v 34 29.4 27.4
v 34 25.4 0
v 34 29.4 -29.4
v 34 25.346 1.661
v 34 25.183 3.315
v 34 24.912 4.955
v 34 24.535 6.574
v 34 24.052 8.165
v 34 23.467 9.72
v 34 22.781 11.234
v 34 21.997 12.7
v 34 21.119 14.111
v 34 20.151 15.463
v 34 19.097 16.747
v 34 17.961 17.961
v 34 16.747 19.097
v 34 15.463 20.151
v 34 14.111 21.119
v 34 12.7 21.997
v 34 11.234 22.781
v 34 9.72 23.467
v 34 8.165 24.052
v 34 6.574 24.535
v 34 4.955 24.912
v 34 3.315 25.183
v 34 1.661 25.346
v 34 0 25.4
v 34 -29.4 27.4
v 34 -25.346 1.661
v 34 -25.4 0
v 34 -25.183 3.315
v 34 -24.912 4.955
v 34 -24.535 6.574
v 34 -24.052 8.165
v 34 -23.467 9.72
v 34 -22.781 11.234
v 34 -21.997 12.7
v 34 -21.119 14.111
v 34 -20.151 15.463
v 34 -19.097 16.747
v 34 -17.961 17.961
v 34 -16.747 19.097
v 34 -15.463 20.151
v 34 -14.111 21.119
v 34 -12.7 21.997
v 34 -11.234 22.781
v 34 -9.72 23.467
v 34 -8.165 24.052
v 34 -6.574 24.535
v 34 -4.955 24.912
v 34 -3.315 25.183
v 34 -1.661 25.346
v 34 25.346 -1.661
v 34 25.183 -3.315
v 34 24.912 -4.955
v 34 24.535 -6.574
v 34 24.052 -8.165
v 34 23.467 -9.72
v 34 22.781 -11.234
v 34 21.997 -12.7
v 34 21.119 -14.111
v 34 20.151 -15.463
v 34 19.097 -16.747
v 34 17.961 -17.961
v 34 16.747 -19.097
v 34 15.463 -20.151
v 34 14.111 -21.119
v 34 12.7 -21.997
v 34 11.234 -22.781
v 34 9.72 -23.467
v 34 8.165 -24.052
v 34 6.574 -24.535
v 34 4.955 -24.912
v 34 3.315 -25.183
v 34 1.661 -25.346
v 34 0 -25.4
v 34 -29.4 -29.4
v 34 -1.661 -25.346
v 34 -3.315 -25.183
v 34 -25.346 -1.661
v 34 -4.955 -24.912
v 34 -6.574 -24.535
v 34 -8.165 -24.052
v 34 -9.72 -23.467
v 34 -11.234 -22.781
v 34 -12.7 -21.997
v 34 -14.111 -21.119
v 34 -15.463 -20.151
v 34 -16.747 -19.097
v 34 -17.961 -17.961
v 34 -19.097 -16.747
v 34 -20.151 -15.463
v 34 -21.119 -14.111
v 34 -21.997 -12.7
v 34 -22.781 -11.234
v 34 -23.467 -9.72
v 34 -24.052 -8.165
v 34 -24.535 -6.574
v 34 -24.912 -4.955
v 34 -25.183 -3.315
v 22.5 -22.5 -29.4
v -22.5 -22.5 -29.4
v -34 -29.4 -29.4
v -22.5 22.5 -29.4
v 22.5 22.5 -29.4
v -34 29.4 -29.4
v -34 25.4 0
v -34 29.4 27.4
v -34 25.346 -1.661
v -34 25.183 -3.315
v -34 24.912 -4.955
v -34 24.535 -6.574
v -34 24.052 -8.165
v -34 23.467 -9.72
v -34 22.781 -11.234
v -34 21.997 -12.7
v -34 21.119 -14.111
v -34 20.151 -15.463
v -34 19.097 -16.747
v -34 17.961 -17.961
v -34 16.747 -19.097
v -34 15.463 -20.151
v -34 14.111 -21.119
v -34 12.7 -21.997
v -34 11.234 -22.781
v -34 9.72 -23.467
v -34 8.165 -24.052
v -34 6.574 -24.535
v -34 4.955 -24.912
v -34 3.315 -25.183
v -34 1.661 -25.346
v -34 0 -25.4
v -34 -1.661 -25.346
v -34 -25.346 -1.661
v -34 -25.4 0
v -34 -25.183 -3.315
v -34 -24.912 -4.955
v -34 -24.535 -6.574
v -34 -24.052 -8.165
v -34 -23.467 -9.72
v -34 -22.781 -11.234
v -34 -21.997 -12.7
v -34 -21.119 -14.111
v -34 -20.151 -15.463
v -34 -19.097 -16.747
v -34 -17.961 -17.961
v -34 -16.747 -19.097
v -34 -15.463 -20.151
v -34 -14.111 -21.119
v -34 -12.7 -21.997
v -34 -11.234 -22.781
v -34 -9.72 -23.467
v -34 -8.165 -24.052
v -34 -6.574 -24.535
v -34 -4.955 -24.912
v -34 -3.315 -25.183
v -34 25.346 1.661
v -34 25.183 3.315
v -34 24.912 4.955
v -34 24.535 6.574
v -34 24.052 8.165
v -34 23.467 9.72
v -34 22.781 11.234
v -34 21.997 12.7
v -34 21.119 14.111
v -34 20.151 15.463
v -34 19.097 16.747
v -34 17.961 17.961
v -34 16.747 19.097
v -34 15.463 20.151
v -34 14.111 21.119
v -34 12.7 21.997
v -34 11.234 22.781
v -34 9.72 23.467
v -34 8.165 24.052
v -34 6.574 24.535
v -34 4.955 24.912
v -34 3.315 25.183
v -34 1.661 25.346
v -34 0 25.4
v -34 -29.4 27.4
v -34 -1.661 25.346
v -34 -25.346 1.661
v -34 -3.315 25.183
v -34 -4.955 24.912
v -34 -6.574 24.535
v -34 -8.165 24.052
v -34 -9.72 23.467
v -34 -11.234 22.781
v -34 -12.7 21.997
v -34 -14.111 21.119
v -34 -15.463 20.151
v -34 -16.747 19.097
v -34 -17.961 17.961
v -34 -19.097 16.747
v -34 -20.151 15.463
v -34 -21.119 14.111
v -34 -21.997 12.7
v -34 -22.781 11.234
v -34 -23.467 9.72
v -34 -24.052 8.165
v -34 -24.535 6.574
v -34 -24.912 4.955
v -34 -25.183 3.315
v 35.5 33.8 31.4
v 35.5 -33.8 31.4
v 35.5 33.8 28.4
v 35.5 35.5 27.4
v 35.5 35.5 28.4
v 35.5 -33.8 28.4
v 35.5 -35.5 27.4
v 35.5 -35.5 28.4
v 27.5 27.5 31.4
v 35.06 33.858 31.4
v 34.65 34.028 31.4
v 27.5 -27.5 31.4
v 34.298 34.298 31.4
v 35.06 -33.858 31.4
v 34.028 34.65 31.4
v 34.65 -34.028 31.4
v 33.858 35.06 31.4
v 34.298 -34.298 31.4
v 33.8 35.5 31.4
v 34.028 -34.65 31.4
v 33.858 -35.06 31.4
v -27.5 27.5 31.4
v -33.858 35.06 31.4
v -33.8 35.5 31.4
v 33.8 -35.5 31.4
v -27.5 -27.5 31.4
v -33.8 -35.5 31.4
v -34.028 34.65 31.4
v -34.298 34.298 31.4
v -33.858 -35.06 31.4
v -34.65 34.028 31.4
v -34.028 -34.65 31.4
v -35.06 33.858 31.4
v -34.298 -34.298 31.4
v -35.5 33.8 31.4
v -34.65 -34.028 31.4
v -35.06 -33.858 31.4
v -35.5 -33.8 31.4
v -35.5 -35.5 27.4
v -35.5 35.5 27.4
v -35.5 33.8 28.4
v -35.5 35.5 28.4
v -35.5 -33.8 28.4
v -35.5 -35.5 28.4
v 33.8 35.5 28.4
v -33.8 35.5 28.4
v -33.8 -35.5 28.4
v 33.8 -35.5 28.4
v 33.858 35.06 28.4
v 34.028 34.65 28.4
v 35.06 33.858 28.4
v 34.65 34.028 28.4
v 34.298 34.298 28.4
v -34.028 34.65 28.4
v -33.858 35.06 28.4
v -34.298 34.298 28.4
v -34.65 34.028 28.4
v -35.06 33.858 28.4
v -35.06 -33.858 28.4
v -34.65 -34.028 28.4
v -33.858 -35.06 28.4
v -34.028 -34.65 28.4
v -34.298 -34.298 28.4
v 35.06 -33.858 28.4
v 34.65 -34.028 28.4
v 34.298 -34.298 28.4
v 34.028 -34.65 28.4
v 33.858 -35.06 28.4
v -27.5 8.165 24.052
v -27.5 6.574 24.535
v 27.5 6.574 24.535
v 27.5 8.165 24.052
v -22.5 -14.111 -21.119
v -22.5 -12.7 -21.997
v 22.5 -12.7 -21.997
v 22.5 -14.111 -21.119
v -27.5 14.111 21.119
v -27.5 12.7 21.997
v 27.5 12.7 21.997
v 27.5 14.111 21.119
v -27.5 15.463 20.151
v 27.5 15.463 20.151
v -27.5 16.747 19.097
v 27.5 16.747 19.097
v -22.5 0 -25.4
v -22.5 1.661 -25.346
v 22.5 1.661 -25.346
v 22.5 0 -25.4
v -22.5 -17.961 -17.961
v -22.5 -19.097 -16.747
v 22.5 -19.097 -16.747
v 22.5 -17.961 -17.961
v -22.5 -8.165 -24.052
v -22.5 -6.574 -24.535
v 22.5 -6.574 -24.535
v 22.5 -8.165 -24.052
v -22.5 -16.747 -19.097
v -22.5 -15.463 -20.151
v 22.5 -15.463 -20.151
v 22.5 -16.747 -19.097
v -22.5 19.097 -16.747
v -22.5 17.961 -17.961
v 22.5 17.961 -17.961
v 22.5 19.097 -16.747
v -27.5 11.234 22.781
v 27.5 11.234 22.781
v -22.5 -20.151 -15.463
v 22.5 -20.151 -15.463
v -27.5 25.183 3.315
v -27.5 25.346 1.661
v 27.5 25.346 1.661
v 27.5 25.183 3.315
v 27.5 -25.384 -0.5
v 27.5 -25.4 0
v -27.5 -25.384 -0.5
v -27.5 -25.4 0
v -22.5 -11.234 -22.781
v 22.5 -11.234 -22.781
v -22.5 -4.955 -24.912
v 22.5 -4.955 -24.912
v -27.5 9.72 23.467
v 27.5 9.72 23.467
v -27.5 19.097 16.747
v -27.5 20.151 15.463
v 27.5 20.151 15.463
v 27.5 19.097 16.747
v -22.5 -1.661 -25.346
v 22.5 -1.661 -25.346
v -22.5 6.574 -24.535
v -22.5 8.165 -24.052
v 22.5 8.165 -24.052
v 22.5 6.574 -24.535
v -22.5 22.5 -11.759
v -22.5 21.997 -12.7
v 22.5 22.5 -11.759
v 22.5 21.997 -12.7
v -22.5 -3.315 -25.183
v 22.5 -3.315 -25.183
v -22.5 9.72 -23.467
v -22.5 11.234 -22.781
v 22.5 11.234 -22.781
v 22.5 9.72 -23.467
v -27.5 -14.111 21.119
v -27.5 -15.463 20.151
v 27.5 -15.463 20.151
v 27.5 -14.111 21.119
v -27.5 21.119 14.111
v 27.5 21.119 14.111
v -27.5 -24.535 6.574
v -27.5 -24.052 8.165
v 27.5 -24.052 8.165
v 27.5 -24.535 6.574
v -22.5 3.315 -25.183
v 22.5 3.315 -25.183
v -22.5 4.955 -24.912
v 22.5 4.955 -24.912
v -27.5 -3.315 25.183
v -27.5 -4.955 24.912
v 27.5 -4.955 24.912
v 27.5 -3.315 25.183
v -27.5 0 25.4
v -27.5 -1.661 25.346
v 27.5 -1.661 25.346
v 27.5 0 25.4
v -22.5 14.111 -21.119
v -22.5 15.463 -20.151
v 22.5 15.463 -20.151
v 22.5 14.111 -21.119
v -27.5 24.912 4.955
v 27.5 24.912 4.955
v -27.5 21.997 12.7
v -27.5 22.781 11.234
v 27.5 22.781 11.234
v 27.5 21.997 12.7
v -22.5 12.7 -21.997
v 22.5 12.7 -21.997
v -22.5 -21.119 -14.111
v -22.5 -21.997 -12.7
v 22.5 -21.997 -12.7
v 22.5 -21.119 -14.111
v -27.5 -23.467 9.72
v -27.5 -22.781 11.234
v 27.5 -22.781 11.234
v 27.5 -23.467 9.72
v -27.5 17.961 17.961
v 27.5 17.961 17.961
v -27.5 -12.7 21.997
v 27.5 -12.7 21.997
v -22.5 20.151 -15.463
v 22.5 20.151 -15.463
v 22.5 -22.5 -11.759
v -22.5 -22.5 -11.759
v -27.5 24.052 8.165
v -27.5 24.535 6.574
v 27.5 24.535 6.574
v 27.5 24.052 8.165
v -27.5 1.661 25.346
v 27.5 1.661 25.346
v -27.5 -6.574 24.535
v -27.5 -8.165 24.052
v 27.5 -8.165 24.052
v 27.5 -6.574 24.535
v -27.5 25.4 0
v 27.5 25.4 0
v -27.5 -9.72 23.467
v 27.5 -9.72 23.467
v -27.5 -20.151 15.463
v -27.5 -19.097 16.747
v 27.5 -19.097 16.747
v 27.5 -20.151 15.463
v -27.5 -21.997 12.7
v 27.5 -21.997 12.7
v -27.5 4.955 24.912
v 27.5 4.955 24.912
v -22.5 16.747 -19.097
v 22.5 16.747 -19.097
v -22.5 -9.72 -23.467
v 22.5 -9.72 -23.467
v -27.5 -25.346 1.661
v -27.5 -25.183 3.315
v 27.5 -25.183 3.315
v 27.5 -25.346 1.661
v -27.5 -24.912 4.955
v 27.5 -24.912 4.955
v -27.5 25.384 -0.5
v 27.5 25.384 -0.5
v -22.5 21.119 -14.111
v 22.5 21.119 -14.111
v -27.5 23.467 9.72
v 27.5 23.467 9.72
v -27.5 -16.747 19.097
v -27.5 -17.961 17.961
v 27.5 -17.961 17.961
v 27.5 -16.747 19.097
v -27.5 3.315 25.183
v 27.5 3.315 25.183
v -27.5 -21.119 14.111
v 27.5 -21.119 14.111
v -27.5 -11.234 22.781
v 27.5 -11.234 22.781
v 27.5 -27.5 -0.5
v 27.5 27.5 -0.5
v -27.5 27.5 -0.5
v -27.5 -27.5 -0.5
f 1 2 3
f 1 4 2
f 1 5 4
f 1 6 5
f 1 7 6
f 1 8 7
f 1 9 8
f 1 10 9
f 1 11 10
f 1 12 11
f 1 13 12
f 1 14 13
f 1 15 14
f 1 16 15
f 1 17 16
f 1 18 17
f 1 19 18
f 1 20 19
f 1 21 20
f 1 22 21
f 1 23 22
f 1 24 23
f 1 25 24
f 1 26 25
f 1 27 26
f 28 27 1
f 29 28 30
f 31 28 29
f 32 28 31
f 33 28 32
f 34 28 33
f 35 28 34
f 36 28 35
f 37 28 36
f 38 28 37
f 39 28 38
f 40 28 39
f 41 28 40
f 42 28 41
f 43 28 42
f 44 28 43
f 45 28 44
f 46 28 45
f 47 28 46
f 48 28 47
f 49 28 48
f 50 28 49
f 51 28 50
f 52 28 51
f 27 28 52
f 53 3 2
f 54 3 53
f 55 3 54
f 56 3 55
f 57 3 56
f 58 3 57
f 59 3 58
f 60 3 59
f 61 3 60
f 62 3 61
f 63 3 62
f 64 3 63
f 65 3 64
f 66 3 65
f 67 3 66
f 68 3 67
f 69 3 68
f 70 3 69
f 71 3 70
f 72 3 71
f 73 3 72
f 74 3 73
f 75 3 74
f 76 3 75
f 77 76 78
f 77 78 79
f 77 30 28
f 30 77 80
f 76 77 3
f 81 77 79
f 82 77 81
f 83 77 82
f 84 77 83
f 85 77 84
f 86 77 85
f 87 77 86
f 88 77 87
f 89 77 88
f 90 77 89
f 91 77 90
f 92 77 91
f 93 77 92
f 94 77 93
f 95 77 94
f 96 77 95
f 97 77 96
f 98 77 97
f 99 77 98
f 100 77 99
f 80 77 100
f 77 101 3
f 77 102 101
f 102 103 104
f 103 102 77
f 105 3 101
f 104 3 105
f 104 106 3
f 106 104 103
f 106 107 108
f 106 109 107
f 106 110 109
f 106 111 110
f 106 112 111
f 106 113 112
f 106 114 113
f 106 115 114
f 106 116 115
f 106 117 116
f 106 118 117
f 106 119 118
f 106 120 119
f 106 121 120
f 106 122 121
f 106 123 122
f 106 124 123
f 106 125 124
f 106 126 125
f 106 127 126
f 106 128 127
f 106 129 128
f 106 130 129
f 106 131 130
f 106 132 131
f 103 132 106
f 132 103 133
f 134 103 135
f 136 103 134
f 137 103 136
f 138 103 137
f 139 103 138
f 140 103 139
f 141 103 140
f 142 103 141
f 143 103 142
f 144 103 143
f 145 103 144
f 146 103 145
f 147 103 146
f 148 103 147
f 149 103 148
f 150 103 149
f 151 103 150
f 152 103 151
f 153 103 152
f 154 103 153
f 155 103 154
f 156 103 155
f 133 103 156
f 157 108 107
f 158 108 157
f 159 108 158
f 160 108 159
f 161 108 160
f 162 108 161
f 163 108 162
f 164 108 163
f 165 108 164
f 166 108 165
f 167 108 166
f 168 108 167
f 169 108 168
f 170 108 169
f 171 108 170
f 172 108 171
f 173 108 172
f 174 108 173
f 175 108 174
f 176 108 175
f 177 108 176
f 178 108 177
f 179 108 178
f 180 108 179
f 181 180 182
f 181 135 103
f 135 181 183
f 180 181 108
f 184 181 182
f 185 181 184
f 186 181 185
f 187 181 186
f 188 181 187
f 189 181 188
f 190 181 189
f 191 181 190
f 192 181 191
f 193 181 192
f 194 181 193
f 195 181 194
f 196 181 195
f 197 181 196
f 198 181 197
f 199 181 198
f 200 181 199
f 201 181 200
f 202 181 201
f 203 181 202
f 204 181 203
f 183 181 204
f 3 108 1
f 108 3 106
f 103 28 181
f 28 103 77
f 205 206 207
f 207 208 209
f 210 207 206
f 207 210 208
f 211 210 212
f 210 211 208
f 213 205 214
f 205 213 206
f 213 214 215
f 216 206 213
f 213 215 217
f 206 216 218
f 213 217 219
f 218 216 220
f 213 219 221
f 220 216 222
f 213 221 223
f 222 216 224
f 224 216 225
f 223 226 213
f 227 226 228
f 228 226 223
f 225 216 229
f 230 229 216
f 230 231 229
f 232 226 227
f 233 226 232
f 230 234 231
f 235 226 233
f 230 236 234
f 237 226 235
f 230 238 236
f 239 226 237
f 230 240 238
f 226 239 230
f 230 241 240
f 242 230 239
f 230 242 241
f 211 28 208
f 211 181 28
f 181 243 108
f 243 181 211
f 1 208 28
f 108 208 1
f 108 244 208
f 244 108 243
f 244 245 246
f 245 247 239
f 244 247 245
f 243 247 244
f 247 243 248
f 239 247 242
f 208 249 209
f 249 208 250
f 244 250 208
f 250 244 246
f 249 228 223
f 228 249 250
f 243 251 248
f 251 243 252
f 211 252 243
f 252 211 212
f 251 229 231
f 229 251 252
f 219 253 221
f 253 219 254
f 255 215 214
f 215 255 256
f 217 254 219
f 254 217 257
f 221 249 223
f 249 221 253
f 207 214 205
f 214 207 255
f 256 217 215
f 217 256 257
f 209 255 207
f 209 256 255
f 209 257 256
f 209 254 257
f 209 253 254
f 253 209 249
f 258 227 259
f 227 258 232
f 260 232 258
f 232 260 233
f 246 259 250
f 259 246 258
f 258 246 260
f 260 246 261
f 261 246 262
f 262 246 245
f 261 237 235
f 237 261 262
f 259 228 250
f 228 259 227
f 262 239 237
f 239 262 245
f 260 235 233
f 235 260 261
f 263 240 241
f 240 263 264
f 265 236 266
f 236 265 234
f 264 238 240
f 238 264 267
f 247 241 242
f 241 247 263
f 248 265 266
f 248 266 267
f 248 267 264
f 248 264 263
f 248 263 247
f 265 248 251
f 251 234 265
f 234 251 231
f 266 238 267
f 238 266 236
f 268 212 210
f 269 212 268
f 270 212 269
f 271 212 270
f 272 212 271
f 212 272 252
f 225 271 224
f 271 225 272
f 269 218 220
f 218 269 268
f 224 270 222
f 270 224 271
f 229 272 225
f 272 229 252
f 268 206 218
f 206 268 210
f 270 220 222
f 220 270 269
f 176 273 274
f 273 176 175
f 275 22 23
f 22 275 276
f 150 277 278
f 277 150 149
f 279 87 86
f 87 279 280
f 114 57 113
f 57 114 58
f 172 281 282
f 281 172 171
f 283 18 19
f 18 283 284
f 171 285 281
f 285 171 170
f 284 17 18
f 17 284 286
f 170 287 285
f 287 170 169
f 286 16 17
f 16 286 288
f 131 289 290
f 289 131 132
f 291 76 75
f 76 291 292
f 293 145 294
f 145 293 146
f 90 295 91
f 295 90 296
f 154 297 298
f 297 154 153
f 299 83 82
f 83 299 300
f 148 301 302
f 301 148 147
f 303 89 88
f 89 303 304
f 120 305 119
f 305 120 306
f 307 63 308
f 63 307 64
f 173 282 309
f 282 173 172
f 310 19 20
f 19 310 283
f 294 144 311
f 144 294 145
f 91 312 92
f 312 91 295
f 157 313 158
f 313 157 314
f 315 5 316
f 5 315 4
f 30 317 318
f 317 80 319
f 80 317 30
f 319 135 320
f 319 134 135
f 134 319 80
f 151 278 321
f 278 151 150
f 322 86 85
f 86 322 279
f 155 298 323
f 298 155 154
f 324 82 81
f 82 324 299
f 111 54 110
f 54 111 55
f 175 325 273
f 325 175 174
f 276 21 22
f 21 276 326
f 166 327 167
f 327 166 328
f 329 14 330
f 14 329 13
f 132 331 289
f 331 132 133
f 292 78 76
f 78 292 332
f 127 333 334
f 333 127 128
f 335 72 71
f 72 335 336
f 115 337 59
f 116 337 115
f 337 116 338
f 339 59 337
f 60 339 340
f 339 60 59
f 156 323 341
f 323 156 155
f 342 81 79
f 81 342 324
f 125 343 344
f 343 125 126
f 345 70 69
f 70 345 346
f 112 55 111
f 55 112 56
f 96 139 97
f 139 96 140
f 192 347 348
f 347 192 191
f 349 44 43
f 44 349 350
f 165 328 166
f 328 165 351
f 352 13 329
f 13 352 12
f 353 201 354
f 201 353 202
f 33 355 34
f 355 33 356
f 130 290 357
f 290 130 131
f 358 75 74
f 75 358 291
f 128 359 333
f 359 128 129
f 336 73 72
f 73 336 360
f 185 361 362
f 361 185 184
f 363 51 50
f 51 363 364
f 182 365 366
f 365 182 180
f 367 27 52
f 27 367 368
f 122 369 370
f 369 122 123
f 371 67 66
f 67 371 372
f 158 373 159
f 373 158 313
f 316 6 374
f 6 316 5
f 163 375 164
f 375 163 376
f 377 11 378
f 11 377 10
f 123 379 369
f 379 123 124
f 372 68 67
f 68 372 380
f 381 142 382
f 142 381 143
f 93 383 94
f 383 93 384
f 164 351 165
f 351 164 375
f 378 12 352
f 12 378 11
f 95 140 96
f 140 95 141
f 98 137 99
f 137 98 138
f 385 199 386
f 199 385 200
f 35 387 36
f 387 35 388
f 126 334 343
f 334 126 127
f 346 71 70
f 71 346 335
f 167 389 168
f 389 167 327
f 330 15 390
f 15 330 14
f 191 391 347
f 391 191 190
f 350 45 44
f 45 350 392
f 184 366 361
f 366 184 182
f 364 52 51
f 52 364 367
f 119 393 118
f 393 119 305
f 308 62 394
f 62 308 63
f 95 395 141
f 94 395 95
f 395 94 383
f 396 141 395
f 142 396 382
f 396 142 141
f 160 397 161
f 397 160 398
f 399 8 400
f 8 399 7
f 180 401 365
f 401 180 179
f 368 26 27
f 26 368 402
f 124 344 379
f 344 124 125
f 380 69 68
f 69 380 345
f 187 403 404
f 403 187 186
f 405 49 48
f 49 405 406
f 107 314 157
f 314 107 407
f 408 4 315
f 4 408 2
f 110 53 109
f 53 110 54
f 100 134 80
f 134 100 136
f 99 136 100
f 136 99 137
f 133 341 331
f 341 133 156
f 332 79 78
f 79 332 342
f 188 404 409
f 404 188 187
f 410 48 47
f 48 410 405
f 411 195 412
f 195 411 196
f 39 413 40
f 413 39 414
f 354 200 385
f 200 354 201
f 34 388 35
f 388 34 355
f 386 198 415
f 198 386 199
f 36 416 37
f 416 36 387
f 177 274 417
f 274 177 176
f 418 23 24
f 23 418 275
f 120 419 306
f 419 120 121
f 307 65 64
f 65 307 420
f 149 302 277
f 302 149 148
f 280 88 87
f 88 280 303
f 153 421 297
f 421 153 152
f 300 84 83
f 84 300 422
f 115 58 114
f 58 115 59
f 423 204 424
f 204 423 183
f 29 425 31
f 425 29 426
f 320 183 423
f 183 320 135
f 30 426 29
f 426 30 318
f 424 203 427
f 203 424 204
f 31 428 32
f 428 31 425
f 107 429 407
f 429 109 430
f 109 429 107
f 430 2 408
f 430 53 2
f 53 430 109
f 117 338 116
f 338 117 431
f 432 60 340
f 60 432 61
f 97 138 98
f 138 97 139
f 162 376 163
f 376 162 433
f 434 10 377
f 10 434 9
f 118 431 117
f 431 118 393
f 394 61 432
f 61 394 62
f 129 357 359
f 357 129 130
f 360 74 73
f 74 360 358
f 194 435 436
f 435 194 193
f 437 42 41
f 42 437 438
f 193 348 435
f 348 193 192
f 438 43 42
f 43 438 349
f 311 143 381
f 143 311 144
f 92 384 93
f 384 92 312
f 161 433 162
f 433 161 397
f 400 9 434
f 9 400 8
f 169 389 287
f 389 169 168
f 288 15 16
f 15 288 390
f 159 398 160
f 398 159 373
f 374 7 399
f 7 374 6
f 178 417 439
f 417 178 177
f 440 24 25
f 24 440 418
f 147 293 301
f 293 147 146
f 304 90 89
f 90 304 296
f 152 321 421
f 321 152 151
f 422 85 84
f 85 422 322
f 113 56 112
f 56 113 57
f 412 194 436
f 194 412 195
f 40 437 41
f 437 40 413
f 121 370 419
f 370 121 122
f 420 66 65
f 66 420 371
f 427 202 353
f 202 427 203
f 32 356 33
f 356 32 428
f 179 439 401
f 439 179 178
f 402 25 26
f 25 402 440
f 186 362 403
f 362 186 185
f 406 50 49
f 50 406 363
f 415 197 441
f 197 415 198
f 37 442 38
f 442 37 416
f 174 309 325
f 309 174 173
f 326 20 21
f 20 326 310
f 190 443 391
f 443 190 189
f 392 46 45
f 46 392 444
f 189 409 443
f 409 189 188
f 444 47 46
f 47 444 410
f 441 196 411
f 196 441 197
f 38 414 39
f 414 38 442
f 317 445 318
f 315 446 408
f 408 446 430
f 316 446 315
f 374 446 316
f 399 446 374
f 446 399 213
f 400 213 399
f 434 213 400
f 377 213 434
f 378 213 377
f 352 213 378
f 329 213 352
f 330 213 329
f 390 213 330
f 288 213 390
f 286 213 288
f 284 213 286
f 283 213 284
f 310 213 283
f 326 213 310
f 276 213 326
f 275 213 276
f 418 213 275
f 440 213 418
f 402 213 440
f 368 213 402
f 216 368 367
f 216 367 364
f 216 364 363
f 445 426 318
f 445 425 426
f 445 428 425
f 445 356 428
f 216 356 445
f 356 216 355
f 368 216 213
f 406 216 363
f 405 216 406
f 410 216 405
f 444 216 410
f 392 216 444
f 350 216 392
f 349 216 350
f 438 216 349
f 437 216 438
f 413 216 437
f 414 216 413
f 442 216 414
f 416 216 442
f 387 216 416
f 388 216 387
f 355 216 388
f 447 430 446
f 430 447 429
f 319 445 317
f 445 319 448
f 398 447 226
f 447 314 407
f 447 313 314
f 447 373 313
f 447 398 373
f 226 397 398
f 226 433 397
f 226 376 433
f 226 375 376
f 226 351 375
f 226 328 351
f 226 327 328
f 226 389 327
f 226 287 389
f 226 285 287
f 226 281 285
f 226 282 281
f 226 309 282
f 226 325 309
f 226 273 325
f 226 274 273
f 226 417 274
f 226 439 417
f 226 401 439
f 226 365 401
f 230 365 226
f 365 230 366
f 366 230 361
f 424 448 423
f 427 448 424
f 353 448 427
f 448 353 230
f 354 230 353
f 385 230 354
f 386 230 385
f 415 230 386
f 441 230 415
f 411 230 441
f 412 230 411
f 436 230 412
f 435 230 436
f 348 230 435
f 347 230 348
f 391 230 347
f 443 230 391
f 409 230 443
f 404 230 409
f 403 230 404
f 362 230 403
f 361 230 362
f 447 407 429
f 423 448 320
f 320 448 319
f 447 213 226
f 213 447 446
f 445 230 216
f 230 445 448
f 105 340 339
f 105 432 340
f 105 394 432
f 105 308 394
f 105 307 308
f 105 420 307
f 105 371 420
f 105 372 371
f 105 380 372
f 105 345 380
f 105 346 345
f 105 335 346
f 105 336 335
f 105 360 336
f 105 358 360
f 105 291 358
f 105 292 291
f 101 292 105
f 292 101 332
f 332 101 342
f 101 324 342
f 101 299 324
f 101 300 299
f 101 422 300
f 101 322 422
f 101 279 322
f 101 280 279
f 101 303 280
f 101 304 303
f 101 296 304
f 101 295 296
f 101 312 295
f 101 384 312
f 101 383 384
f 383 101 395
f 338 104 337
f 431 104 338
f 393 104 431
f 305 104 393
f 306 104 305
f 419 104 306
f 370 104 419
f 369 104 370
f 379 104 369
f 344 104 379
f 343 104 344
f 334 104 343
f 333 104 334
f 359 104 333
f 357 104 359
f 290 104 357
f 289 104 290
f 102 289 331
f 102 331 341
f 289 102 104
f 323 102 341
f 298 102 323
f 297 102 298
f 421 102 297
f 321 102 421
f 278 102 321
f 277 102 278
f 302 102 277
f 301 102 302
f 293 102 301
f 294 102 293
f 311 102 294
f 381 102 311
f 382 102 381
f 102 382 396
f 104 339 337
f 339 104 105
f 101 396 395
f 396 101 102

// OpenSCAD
// file: common.scad
// common.scad — every dimension in the feeder lives here.
// Change a value, re-run ../check.sh, and every part regrows together.

/* ---------- Printer envelope ---------- */
bed_x = 220;
bed_y = 220;
bed_z = 250;

/* ---------- Material and process ---------- */
wall      = 2.0;    // nominal wall thickness (5 perimeters at 0.4 nozzle)
fit_slide = 0.30;   // clearance for parts that must move against each other
fit_press = 0.15;   // clearance for parts pressed together
$fn       = 96;

/* ---------- Fasteners ---------- */
m3_free = 3.4;      // M3 clearance hole
m3_tap  = 2.8;      // M3 self-tapping into plastic
m4_free = 4.5;

/* ---------- Load cells (VERIFY against the cells you actually buy) ----------
   Figures below are for the common YZC-133 straight bar. Bolt spacing varies
   between suppliers; measure yours before printing the base or the platform. */
cell_l            = 80;
cell_w            = 12.7;
cell_h            = 12.7;
cell_bolt_spacing = 15;   // centre-to-centre, at each end
cell_gap          = 3;    // spacer thickness — the beam MUST be free to flex

/* ---------- Food model ---------- */
kibble_density = 0.40;   // g/cm^3, dry kibble bulk density

/* ---------- Hopper ---------- */
hopper_volume_l = 2.0;
hopper_mouth    = 140;   // inner, square, at the top
hopper_throat   = 55;    // inner, square, at the bottom

// Square frustum volume: V = h/3 * (A1 + A2 + sqrt(A1*A2))
// For squares sqrt(A1*A2) collapses to mouth*throat, so height is exact:
hopper_h = 3 * hopper_volume_l * 1000000 /
           (hopper_mouth*hopper_mouth + hopper_throat*hopper_throat +
            hopper_mouth*hopper_throat);

hopper_run        = (hopper_mouth - hopper_throat) / 2;
hopper_wall_angle = atan(hopper_h / hopper_run);   // from horizontal
hopper_taper_rate = (hopper_mouth - hopper_throat) / hopper_h;
hopper_capacity_g = hopper_volume_l * 1000 * kibble_density;

/* ---------- Drum valve ---------- */
drum_dia       = 50;
drum_len       = 60;
drum_clearance = 0.4;                      // radial
drum_bore      = drum_dia + 2*drum_clearance;
pocket_depth   = 11.3;                     // segment depth of the scoop
shaft_dia      = 6;
shaft_len      = 8;

// Circular-segment maths. OpenSCAD trig is in DEGREES; the segment area
// formula needs the angle in RADIANS, hence the two forms below.
drum_r          = drum_dia / 2;
pocket_theta    = 2 * acos(1 - pocket_depth/drum_r);        // degrees
pocket_theta_r  = pocket_theta * PI / 180;                  // radians
pocket_area     = drum_r*drum_r/2 * (pocket_theta_r - sin(pocket_theta));
pocket_volume   = pocket_area * drum_len;                   // mm^3
sweep_grams     = pocket_volume / 1000 * kibble_density;    // DERIVED, not assumed

/* ---------- Valve housing ---------- */
housing_x = drum_len + 4*wall;      // along the drum axis
housing_y = drum_bore + 4*wall;
housing_z = drum_bore + 4*wall;
outlet_x  = 45;
outlet_y  = 45;

/* ---------- Chute ---------- */
chute_forward = 70;    // how far forward of the tower the food lands
chute_drop    = 90;    // vertical fall from valve outlet to chute exit
chute_exit    = 40;
chute_clear   = 40;    // exit height above the bowl rim — impulse, not load

/* ---------- Bowl and platform ---------- */
bowl_dia     = 140;    // the BOUGHT stainless/ceramic bowl
platform_dia = 150;
platform_t   = 5;
ring_w       = 3;
ring_h       = 8;
bowl_gap     = 6;      // air on every side — the isolation gap

/* ---------- Base and tower ---------- */
base_size = 190;
base_t    = 6;
bay_h     = 28;        // electronics bay height
tower_w   = 90;
tower_d   = 70;
tower_h   = 150;

/* ---------- Head ---------- */
head_tilt   = 30;      // camera, degrees down from horizontal
cam_pcb     = [40, 40, 1.6];
sr04_dia    = 16;
sr04_pitch  = 26;      // centre-to-centre of the two transducers

/* ---------- Derived overall ---------- */
total_h = base_t + bay_h + tower_h + housing_z + hopper_h;

/* ---------- Assertions: the things that silently ruin a print ---------- */
assert(hopper_wall_angle >= 60,
       str("Hopper wall ", hopper_wall_angle, " deg is below 60 - kibble will bridge"));
assert(hopper_h + 2*wall <= bed_z,
       str("Hopper ", hopper_h, " mm exceeds bed Z ", bed_z));
assert(hopper_mouth + 2*wall <= bed_x,
       "Hopper mouth exceeds bed X");
assert(base_size <= bed_x && base_size <= bed_y,
       "Base exceeds bed footprint");
assert(platform_dia <= bed_x, "Bowl platform exceeds bed X");
assert(drum_clearance > 0, "Drum clearance must be positive or the drum seizes");
assert(drum_bore > drum_dia, "Drum bore must exceed drum diameter");
assert(pocket_depth < drum_r,
       "Pocket deeper than the drum radius - the scoop would cut through the axis");
assert(sweep_grams > 6 && sweep_grams < 10,
       str("Sweep delivers ", sweep_grams, " g - outside the 6-10 g design window"));
assert(bowl_gap > 0, "Bowl isolation gap must be positive");
assert(cell_gap > 0, "Load cell needs a flex gap or it reads nothing");
assert(chute_forward + 40 <= bed_y,
       "Bowl arm exceeds bed Y - split it or shorten chute_forward");

/* ---------- Shared geometry ---------- */
// A square frustum, bottom face on the XY plane, centred on Z.
module frustum(bottom, top, h) {
  linear_extrude(height = h, scale = top/bottom)
    square([bottom, bottom], center = true);
}

// A rectangular tube used for the labyrinth lip on the lid and hopper mouth.
module lip(inner, thickness, h) {
  difference() {
    cube([inner + 2*thickness, inner + 2*thickness, h], center = true);
    cube([inner, inner, h + 1], center = true);
  }
}

// Four bolt holes on a square pattern.
module bolt_square(spacing, dia, h) {
  for (i = [0:3])
    rotate([0, 0, 90*i])
      translate([spacing/2, spacing/2, 0])
        cylinder(d = dia, h = h, center = true, $fn = 24);
}

// The cantilever footprint a load cell bolts into: two holes plus a relief slot.
module cell_mount(dia = m3_tap, h = 10) {
  for (y = [-cell_bolt_spacing/2, cell_bolt_spacing/2])
    translate([0, y, 0]) cylinder(d = dia, h = h, center = true, $fn = 24);
}

echo(str("hopper_h = ", hopper_h, " mm"));
echo(str("hopper wall angle = ", hopper_wall_angle, " deg"));
echo(str("hopper capacity = ", hopper_capacity_g, " g"));
echo(str("sweep = ", sweep_grams, " g"));
echo(str("total height = ", total_h, " mm"));
// main file
include <common.scad>

flange_w     = 6;
flange_t     = 4;
flange_bolts = hopper_throat + 2*wall + 12;
servo_body   = [23, 12.5, 22.5];    // SG90 / MG90S body
servo_lug    = 32;                  // lug hole centres

module valve_housing() {
  difference() {
    union() {
      cube([housing_x, housing_y, housing_z], center = true);
      // Top flange, bolts to the hopper throat.
      translate([0, 0, housing_z/2])
        cube([hopper_throat + 2*wall + 2*flange_w,
              hopper_throat + 2*wall + 2*flange_w, flange_t], center = true);
    }

    // Drum bore, axis along X.
    rotate([0, 90, 0])
      cylinder(d = drum_bore, h = housing_x + 2, center = true);

    // Inlet from the hopper — top half only, so the drum still seals at rest.
    translate([0, 0, housing_z/4 + flange_t/2])
      cube([hopper_throat, hopper_throat, housing_z/2 + flange_t + 1], center = true);

    // Outlet to the chute — bottom half only.
    translate([0, 0, -housing_z/4])
      cube([outlet_x, outlet_y, housing_z/2 + 1], center = true);

    // Flange bolt holes.
    translate([0, 0, housing_z/2 + flange_t/2])
      bolt_square(flange_bolts, m3_free, flange_t + 2);

    // Servo pocket in the +X wall. The servo mounts to THIS part, which
    // floats on the load cell. Never mount it to the tower.
    translate([housing_x/2 - servo_body[2]/2 + 1, 0, 0])
      cube(servo_body, center = true);
    for (y = [-servo_lug/2, servo_lug/2])
      translate([housing_x/2 - 6, y, 0])
        rotate([0, 90, 0]) cylinder(d = m3_tap, h = 14, center = true, $fn = 24);
  }
}

valve_housing();
